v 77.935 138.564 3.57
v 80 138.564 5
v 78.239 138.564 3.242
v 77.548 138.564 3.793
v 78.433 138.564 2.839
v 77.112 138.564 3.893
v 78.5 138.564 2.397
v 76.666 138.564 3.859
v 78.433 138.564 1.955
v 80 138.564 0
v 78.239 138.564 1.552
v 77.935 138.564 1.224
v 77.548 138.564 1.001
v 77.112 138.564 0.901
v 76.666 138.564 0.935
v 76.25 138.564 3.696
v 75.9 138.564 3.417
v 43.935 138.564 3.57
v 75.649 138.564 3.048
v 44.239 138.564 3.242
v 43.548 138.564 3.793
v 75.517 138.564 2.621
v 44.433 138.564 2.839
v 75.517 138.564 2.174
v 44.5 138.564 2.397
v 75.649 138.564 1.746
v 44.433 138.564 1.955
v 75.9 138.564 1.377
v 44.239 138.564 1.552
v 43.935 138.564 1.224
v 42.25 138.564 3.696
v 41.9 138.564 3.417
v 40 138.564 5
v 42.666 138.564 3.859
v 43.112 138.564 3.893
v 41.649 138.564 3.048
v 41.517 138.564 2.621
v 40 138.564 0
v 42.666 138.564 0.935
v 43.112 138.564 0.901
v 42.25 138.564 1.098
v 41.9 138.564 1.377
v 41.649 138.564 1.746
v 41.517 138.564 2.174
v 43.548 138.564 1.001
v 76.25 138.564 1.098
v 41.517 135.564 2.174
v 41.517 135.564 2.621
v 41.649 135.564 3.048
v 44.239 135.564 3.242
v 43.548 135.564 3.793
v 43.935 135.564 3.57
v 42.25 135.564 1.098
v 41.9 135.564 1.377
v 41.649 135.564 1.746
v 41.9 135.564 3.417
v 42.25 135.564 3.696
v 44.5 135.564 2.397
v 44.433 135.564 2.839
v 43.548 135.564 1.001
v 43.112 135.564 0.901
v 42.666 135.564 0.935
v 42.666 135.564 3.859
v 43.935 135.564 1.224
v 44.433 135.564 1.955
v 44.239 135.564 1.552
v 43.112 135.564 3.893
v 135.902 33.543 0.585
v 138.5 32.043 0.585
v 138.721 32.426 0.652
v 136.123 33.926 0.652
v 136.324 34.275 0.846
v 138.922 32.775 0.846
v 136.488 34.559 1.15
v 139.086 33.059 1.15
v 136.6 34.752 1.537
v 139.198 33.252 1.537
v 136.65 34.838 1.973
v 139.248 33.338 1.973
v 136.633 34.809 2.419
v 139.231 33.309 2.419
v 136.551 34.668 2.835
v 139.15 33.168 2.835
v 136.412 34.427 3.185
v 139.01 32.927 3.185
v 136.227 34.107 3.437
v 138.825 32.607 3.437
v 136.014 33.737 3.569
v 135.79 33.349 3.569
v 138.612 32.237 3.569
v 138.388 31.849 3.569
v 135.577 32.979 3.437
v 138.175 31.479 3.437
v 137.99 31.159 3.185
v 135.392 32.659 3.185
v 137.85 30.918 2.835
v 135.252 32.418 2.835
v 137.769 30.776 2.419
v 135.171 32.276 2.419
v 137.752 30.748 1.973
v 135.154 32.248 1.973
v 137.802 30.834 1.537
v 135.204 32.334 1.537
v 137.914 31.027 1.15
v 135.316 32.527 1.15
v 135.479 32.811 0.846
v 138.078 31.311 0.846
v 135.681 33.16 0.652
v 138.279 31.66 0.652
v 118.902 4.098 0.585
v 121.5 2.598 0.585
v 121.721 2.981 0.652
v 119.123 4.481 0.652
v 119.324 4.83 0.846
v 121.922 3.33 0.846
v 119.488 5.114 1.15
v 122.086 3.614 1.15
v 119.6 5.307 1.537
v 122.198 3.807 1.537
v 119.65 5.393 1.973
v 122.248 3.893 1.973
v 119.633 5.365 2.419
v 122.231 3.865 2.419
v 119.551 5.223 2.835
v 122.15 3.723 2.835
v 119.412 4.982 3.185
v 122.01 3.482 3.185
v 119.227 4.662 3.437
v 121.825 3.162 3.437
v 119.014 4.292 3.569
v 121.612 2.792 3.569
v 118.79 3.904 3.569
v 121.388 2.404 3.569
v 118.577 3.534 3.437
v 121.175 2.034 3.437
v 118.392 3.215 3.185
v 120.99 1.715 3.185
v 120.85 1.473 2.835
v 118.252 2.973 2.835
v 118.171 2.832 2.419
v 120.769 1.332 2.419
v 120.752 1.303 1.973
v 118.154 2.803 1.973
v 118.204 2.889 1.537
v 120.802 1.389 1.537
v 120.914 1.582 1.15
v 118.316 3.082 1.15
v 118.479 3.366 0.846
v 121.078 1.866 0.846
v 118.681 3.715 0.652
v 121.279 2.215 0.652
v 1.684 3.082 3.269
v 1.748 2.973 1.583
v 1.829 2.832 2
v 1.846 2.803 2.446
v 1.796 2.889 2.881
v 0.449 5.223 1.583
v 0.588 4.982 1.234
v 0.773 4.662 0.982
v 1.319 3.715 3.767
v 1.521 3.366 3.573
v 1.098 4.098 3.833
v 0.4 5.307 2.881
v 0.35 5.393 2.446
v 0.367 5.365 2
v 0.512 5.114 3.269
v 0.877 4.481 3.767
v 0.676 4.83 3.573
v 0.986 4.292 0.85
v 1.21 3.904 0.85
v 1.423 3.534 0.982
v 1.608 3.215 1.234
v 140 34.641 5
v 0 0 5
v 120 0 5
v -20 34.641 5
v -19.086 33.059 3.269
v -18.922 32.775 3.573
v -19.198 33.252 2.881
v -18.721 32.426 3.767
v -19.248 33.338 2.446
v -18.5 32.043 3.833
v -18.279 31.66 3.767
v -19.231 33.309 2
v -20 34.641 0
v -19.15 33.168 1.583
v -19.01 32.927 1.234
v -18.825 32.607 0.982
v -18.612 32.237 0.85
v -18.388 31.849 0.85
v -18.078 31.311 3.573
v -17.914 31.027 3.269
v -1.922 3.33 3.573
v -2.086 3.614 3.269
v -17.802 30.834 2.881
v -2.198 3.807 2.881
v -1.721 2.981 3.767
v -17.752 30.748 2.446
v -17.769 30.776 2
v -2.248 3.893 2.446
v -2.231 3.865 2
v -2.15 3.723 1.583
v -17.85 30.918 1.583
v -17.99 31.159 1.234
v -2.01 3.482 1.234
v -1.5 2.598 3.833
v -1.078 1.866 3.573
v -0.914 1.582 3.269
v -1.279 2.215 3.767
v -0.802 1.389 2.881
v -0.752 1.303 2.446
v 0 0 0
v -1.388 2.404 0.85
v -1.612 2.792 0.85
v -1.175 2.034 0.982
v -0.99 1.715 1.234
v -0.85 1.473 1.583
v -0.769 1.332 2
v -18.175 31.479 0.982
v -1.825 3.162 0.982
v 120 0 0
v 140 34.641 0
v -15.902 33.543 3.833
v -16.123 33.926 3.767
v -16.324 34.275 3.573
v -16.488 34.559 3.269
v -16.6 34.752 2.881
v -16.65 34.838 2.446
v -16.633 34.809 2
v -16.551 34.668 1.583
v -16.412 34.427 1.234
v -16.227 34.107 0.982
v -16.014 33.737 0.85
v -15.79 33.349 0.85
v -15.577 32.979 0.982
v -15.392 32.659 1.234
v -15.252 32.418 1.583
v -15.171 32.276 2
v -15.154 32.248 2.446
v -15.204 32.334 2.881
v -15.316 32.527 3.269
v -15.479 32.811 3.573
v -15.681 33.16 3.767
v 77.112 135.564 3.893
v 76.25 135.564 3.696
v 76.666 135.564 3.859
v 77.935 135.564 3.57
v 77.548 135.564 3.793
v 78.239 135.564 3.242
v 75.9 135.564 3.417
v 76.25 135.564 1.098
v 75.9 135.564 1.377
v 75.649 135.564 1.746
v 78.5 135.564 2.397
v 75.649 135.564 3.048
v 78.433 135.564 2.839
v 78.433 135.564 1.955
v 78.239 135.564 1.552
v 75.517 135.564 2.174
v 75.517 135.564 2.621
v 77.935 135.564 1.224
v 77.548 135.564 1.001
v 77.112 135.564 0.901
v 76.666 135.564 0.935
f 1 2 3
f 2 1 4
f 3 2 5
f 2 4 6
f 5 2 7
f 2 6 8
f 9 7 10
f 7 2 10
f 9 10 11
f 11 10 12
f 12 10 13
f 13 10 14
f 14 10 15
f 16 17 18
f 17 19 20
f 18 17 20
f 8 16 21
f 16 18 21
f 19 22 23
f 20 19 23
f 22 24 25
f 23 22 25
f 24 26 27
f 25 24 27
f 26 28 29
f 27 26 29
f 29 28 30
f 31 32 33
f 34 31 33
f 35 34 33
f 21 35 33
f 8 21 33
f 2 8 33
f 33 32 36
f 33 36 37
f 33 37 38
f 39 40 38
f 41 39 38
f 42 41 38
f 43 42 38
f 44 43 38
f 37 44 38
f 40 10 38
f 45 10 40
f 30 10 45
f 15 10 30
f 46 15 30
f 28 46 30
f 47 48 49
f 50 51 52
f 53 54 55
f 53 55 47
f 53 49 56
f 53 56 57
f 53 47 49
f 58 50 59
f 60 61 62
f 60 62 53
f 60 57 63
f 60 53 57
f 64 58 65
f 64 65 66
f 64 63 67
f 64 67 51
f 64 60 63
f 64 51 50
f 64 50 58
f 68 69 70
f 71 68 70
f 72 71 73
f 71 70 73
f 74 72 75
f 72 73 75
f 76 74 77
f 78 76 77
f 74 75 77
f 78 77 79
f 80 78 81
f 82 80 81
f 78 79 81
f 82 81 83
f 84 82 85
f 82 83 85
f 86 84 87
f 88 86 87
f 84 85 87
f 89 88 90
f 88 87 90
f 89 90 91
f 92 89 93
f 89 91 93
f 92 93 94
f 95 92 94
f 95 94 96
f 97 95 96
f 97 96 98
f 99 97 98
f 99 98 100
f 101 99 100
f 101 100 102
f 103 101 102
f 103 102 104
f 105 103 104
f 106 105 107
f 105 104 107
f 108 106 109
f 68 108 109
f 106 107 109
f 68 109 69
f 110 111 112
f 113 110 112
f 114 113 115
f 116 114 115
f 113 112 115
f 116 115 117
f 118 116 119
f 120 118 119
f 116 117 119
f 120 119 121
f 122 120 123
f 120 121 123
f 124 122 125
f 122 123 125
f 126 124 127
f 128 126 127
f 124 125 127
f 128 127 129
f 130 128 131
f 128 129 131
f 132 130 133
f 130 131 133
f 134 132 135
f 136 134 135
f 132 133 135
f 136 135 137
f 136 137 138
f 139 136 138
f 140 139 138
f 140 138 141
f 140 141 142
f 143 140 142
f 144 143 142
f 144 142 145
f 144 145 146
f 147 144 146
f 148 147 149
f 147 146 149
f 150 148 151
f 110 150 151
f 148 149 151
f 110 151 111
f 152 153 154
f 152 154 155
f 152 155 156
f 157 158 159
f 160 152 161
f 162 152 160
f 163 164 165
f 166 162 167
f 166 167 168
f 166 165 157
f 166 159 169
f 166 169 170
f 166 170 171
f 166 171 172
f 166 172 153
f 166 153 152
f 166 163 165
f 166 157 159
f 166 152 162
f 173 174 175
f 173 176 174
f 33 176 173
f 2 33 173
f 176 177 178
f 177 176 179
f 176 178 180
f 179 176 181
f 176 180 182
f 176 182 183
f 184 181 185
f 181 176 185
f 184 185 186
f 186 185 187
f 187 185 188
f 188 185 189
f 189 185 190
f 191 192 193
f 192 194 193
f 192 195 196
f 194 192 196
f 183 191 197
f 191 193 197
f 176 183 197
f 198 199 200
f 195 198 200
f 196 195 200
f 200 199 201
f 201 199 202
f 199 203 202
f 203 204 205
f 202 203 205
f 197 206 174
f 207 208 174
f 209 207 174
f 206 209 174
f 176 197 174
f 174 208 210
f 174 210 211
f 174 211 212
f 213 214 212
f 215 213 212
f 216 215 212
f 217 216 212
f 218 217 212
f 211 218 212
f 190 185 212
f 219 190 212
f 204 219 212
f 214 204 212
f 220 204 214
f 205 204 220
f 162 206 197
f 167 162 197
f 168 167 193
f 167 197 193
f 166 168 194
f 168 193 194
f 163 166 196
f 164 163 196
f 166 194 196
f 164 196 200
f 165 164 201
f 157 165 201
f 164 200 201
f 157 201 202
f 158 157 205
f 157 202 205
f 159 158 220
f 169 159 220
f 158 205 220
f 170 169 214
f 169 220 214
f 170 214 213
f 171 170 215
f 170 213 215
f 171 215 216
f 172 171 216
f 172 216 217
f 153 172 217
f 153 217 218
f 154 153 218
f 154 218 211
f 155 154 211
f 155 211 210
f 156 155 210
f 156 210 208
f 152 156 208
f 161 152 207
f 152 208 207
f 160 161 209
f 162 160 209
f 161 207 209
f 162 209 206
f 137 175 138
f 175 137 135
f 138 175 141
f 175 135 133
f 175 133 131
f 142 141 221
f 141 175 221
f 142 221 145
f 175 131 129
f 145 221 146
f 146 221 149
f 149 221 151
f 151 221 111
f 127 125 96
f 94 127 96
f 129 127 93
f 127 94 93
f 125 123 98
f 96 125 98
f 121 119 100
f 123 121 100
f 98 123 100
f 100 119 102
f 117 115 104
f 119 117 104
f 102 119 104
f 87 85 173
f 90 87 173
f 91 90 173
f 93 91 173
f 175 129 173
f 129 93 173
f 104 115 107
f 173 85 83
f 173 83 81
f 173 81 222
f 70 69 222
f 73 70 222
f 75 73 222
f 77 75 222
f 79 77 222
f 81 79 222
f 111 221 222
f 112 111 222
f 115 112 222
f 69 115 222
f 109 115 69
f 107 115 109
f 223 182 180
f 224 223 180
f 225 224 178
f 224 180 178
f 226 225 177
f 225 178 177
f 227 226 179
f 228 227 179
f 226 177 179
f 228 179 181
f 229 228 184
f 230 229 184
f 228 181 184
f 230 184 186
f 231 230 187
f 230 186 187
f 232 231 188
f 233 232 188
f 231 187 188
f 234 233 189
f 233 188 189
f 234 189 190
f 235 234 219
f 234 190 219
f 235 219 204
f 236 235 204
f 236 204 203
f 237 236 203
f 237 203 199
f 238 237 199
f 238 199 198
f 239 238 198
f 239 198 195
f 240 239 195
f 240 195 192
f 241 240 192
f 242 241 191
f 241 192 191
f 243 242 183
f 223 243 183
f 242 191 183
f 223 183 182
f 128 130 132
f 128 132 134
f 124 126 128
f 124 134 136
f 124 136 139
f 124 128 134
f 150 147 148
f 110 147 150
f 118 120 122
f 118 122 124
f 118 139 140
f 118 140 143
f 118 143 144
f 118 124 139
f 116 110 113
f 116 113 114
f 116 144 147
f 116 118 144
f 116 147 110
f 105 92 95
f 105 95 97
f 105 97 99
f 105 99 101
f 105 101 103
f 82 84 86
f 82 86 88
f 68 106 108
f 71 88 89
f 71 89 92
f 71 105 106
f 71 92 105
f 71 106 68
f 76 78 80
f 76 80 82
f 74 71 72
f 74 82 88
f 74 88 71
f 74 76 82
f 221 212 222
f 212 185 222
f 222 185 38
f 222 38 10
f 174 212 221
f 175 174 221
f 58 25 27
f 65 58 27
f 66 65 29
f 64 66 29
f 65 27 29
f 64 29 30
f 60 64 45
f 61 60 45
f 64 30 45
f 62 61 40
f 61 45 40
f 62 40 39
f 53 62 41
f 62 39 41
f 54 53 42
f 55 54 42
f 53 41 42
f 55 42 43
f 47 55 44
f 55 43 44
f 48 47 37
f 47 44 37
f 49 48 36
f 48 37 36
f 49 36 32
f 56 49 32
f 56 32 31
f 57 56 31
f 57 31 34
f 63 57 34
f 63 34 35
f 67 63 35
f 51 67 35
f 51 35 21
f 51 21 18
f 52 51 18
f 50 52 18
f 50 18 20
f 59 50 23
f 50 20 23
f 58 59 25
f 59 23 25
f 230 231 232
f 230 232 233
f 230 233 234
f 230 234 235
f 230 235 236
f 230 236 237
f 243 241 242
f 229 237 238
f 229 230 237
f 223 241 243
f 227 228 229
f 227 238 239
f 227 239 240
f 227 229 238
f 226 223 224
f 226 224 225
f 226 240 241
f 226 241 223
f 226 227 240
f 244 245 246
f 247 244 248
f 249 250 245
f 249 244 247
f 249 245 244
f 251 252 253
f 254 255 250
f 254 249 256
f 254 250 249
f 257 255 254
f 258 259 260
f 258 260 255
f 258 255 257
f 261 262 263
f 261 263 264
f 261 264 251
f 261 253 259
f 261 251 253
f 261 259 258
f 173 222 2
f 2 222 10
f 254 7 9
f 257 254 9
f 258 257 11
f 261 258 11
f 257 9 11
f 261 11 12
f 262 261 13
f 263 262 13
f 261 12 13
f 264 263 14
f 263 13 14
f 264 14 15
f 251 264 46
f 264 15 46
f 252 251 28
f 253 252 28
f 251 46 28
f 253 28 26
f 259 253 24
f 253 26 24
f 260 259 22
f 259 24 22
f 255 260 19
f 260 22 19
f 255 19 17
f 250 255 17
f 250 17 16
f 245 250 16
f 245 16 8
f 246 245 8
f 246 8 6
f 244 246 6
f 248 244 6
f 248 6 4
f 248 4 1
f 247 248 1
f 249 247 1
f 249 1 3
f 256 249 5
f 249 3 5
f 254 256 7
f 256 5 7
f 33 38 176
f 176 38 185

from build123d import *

# Parameters (mm, degrees)
BOSS_EXTRUDE1_DEPTH = 5
SKETCH3_R           = 1.5
CUT_EXTRUDE1_DEPTH  = 3
SKETCH4_R           = 1.5
CUT_EXTRUDE2_DEPTH  = 3
SKETCH5_R           = 1.5
CUT_EXTRUDE3_DEPTH  = 3


with BuildPart() as part:
    # Sketch1 → Boss-Extrude1 (new body)
    with BuildSketch(Plane.XY):
        Polygon((0, 0), (120, 0), (140, 34.641016151), (80, 138.564064606), (40, 138.564064606), (-20, 34.641016151), align=None)
    extrude(amount=BOSS_EXTRUDE1_DEPTH)

    # Sketch3 → Cut-Extrude1 (cut)
    with BuildSketch(Plane(origin=(0, 0, 0), x_dir=(0, 0, 1), z_dir=(-0.866025404, -0.5, 0))):
        with Locations((2.333426925, 37)):
            Circle(SKETCH3_R)
        with Locations((2.333426925, 3)):
            Circle(SKETCH3_R)
    extrude(amount=-CUT_EXTRUDE1_DEPTH, mode=Mode.SUBTRACT)

    # Sketch4 → Cut-Extrude2 (cut)
    with BuildSketch(Plane(origin=(90, -51.961524227, 0), x_dir=(0, 0, -1), z_dir=(0.866025404, -0.5, 0))):
        with Locations((-2.085466333, 63)):
            Circle(SKETCH4_R)
        with Locations((-2.085466333, 97)):
            Circle(SKETCH4_R)
    extrude(amount=-CUT_EXTRUDE2_DEPTH, mode=Mode.SUBTRACT)

    # Sketch5 → Cut-Extrude3 (cut)
    with BuildSketch(Plane(origin=(0, 138.564064606, 0), x_dir=(1, 0, 0), z_dir=(0, 1, 0))):
        with Locations((77, -2.397088123)):
            Circle(SKETCH5_R)
        with Locations((43, -2.397088123)):
            Circle(SKETCH5_R)
    extrude(amount=-CUT_EXTRUDE3_DEPTH, mode=Mode.SUBTRACT)


solid = part.part
